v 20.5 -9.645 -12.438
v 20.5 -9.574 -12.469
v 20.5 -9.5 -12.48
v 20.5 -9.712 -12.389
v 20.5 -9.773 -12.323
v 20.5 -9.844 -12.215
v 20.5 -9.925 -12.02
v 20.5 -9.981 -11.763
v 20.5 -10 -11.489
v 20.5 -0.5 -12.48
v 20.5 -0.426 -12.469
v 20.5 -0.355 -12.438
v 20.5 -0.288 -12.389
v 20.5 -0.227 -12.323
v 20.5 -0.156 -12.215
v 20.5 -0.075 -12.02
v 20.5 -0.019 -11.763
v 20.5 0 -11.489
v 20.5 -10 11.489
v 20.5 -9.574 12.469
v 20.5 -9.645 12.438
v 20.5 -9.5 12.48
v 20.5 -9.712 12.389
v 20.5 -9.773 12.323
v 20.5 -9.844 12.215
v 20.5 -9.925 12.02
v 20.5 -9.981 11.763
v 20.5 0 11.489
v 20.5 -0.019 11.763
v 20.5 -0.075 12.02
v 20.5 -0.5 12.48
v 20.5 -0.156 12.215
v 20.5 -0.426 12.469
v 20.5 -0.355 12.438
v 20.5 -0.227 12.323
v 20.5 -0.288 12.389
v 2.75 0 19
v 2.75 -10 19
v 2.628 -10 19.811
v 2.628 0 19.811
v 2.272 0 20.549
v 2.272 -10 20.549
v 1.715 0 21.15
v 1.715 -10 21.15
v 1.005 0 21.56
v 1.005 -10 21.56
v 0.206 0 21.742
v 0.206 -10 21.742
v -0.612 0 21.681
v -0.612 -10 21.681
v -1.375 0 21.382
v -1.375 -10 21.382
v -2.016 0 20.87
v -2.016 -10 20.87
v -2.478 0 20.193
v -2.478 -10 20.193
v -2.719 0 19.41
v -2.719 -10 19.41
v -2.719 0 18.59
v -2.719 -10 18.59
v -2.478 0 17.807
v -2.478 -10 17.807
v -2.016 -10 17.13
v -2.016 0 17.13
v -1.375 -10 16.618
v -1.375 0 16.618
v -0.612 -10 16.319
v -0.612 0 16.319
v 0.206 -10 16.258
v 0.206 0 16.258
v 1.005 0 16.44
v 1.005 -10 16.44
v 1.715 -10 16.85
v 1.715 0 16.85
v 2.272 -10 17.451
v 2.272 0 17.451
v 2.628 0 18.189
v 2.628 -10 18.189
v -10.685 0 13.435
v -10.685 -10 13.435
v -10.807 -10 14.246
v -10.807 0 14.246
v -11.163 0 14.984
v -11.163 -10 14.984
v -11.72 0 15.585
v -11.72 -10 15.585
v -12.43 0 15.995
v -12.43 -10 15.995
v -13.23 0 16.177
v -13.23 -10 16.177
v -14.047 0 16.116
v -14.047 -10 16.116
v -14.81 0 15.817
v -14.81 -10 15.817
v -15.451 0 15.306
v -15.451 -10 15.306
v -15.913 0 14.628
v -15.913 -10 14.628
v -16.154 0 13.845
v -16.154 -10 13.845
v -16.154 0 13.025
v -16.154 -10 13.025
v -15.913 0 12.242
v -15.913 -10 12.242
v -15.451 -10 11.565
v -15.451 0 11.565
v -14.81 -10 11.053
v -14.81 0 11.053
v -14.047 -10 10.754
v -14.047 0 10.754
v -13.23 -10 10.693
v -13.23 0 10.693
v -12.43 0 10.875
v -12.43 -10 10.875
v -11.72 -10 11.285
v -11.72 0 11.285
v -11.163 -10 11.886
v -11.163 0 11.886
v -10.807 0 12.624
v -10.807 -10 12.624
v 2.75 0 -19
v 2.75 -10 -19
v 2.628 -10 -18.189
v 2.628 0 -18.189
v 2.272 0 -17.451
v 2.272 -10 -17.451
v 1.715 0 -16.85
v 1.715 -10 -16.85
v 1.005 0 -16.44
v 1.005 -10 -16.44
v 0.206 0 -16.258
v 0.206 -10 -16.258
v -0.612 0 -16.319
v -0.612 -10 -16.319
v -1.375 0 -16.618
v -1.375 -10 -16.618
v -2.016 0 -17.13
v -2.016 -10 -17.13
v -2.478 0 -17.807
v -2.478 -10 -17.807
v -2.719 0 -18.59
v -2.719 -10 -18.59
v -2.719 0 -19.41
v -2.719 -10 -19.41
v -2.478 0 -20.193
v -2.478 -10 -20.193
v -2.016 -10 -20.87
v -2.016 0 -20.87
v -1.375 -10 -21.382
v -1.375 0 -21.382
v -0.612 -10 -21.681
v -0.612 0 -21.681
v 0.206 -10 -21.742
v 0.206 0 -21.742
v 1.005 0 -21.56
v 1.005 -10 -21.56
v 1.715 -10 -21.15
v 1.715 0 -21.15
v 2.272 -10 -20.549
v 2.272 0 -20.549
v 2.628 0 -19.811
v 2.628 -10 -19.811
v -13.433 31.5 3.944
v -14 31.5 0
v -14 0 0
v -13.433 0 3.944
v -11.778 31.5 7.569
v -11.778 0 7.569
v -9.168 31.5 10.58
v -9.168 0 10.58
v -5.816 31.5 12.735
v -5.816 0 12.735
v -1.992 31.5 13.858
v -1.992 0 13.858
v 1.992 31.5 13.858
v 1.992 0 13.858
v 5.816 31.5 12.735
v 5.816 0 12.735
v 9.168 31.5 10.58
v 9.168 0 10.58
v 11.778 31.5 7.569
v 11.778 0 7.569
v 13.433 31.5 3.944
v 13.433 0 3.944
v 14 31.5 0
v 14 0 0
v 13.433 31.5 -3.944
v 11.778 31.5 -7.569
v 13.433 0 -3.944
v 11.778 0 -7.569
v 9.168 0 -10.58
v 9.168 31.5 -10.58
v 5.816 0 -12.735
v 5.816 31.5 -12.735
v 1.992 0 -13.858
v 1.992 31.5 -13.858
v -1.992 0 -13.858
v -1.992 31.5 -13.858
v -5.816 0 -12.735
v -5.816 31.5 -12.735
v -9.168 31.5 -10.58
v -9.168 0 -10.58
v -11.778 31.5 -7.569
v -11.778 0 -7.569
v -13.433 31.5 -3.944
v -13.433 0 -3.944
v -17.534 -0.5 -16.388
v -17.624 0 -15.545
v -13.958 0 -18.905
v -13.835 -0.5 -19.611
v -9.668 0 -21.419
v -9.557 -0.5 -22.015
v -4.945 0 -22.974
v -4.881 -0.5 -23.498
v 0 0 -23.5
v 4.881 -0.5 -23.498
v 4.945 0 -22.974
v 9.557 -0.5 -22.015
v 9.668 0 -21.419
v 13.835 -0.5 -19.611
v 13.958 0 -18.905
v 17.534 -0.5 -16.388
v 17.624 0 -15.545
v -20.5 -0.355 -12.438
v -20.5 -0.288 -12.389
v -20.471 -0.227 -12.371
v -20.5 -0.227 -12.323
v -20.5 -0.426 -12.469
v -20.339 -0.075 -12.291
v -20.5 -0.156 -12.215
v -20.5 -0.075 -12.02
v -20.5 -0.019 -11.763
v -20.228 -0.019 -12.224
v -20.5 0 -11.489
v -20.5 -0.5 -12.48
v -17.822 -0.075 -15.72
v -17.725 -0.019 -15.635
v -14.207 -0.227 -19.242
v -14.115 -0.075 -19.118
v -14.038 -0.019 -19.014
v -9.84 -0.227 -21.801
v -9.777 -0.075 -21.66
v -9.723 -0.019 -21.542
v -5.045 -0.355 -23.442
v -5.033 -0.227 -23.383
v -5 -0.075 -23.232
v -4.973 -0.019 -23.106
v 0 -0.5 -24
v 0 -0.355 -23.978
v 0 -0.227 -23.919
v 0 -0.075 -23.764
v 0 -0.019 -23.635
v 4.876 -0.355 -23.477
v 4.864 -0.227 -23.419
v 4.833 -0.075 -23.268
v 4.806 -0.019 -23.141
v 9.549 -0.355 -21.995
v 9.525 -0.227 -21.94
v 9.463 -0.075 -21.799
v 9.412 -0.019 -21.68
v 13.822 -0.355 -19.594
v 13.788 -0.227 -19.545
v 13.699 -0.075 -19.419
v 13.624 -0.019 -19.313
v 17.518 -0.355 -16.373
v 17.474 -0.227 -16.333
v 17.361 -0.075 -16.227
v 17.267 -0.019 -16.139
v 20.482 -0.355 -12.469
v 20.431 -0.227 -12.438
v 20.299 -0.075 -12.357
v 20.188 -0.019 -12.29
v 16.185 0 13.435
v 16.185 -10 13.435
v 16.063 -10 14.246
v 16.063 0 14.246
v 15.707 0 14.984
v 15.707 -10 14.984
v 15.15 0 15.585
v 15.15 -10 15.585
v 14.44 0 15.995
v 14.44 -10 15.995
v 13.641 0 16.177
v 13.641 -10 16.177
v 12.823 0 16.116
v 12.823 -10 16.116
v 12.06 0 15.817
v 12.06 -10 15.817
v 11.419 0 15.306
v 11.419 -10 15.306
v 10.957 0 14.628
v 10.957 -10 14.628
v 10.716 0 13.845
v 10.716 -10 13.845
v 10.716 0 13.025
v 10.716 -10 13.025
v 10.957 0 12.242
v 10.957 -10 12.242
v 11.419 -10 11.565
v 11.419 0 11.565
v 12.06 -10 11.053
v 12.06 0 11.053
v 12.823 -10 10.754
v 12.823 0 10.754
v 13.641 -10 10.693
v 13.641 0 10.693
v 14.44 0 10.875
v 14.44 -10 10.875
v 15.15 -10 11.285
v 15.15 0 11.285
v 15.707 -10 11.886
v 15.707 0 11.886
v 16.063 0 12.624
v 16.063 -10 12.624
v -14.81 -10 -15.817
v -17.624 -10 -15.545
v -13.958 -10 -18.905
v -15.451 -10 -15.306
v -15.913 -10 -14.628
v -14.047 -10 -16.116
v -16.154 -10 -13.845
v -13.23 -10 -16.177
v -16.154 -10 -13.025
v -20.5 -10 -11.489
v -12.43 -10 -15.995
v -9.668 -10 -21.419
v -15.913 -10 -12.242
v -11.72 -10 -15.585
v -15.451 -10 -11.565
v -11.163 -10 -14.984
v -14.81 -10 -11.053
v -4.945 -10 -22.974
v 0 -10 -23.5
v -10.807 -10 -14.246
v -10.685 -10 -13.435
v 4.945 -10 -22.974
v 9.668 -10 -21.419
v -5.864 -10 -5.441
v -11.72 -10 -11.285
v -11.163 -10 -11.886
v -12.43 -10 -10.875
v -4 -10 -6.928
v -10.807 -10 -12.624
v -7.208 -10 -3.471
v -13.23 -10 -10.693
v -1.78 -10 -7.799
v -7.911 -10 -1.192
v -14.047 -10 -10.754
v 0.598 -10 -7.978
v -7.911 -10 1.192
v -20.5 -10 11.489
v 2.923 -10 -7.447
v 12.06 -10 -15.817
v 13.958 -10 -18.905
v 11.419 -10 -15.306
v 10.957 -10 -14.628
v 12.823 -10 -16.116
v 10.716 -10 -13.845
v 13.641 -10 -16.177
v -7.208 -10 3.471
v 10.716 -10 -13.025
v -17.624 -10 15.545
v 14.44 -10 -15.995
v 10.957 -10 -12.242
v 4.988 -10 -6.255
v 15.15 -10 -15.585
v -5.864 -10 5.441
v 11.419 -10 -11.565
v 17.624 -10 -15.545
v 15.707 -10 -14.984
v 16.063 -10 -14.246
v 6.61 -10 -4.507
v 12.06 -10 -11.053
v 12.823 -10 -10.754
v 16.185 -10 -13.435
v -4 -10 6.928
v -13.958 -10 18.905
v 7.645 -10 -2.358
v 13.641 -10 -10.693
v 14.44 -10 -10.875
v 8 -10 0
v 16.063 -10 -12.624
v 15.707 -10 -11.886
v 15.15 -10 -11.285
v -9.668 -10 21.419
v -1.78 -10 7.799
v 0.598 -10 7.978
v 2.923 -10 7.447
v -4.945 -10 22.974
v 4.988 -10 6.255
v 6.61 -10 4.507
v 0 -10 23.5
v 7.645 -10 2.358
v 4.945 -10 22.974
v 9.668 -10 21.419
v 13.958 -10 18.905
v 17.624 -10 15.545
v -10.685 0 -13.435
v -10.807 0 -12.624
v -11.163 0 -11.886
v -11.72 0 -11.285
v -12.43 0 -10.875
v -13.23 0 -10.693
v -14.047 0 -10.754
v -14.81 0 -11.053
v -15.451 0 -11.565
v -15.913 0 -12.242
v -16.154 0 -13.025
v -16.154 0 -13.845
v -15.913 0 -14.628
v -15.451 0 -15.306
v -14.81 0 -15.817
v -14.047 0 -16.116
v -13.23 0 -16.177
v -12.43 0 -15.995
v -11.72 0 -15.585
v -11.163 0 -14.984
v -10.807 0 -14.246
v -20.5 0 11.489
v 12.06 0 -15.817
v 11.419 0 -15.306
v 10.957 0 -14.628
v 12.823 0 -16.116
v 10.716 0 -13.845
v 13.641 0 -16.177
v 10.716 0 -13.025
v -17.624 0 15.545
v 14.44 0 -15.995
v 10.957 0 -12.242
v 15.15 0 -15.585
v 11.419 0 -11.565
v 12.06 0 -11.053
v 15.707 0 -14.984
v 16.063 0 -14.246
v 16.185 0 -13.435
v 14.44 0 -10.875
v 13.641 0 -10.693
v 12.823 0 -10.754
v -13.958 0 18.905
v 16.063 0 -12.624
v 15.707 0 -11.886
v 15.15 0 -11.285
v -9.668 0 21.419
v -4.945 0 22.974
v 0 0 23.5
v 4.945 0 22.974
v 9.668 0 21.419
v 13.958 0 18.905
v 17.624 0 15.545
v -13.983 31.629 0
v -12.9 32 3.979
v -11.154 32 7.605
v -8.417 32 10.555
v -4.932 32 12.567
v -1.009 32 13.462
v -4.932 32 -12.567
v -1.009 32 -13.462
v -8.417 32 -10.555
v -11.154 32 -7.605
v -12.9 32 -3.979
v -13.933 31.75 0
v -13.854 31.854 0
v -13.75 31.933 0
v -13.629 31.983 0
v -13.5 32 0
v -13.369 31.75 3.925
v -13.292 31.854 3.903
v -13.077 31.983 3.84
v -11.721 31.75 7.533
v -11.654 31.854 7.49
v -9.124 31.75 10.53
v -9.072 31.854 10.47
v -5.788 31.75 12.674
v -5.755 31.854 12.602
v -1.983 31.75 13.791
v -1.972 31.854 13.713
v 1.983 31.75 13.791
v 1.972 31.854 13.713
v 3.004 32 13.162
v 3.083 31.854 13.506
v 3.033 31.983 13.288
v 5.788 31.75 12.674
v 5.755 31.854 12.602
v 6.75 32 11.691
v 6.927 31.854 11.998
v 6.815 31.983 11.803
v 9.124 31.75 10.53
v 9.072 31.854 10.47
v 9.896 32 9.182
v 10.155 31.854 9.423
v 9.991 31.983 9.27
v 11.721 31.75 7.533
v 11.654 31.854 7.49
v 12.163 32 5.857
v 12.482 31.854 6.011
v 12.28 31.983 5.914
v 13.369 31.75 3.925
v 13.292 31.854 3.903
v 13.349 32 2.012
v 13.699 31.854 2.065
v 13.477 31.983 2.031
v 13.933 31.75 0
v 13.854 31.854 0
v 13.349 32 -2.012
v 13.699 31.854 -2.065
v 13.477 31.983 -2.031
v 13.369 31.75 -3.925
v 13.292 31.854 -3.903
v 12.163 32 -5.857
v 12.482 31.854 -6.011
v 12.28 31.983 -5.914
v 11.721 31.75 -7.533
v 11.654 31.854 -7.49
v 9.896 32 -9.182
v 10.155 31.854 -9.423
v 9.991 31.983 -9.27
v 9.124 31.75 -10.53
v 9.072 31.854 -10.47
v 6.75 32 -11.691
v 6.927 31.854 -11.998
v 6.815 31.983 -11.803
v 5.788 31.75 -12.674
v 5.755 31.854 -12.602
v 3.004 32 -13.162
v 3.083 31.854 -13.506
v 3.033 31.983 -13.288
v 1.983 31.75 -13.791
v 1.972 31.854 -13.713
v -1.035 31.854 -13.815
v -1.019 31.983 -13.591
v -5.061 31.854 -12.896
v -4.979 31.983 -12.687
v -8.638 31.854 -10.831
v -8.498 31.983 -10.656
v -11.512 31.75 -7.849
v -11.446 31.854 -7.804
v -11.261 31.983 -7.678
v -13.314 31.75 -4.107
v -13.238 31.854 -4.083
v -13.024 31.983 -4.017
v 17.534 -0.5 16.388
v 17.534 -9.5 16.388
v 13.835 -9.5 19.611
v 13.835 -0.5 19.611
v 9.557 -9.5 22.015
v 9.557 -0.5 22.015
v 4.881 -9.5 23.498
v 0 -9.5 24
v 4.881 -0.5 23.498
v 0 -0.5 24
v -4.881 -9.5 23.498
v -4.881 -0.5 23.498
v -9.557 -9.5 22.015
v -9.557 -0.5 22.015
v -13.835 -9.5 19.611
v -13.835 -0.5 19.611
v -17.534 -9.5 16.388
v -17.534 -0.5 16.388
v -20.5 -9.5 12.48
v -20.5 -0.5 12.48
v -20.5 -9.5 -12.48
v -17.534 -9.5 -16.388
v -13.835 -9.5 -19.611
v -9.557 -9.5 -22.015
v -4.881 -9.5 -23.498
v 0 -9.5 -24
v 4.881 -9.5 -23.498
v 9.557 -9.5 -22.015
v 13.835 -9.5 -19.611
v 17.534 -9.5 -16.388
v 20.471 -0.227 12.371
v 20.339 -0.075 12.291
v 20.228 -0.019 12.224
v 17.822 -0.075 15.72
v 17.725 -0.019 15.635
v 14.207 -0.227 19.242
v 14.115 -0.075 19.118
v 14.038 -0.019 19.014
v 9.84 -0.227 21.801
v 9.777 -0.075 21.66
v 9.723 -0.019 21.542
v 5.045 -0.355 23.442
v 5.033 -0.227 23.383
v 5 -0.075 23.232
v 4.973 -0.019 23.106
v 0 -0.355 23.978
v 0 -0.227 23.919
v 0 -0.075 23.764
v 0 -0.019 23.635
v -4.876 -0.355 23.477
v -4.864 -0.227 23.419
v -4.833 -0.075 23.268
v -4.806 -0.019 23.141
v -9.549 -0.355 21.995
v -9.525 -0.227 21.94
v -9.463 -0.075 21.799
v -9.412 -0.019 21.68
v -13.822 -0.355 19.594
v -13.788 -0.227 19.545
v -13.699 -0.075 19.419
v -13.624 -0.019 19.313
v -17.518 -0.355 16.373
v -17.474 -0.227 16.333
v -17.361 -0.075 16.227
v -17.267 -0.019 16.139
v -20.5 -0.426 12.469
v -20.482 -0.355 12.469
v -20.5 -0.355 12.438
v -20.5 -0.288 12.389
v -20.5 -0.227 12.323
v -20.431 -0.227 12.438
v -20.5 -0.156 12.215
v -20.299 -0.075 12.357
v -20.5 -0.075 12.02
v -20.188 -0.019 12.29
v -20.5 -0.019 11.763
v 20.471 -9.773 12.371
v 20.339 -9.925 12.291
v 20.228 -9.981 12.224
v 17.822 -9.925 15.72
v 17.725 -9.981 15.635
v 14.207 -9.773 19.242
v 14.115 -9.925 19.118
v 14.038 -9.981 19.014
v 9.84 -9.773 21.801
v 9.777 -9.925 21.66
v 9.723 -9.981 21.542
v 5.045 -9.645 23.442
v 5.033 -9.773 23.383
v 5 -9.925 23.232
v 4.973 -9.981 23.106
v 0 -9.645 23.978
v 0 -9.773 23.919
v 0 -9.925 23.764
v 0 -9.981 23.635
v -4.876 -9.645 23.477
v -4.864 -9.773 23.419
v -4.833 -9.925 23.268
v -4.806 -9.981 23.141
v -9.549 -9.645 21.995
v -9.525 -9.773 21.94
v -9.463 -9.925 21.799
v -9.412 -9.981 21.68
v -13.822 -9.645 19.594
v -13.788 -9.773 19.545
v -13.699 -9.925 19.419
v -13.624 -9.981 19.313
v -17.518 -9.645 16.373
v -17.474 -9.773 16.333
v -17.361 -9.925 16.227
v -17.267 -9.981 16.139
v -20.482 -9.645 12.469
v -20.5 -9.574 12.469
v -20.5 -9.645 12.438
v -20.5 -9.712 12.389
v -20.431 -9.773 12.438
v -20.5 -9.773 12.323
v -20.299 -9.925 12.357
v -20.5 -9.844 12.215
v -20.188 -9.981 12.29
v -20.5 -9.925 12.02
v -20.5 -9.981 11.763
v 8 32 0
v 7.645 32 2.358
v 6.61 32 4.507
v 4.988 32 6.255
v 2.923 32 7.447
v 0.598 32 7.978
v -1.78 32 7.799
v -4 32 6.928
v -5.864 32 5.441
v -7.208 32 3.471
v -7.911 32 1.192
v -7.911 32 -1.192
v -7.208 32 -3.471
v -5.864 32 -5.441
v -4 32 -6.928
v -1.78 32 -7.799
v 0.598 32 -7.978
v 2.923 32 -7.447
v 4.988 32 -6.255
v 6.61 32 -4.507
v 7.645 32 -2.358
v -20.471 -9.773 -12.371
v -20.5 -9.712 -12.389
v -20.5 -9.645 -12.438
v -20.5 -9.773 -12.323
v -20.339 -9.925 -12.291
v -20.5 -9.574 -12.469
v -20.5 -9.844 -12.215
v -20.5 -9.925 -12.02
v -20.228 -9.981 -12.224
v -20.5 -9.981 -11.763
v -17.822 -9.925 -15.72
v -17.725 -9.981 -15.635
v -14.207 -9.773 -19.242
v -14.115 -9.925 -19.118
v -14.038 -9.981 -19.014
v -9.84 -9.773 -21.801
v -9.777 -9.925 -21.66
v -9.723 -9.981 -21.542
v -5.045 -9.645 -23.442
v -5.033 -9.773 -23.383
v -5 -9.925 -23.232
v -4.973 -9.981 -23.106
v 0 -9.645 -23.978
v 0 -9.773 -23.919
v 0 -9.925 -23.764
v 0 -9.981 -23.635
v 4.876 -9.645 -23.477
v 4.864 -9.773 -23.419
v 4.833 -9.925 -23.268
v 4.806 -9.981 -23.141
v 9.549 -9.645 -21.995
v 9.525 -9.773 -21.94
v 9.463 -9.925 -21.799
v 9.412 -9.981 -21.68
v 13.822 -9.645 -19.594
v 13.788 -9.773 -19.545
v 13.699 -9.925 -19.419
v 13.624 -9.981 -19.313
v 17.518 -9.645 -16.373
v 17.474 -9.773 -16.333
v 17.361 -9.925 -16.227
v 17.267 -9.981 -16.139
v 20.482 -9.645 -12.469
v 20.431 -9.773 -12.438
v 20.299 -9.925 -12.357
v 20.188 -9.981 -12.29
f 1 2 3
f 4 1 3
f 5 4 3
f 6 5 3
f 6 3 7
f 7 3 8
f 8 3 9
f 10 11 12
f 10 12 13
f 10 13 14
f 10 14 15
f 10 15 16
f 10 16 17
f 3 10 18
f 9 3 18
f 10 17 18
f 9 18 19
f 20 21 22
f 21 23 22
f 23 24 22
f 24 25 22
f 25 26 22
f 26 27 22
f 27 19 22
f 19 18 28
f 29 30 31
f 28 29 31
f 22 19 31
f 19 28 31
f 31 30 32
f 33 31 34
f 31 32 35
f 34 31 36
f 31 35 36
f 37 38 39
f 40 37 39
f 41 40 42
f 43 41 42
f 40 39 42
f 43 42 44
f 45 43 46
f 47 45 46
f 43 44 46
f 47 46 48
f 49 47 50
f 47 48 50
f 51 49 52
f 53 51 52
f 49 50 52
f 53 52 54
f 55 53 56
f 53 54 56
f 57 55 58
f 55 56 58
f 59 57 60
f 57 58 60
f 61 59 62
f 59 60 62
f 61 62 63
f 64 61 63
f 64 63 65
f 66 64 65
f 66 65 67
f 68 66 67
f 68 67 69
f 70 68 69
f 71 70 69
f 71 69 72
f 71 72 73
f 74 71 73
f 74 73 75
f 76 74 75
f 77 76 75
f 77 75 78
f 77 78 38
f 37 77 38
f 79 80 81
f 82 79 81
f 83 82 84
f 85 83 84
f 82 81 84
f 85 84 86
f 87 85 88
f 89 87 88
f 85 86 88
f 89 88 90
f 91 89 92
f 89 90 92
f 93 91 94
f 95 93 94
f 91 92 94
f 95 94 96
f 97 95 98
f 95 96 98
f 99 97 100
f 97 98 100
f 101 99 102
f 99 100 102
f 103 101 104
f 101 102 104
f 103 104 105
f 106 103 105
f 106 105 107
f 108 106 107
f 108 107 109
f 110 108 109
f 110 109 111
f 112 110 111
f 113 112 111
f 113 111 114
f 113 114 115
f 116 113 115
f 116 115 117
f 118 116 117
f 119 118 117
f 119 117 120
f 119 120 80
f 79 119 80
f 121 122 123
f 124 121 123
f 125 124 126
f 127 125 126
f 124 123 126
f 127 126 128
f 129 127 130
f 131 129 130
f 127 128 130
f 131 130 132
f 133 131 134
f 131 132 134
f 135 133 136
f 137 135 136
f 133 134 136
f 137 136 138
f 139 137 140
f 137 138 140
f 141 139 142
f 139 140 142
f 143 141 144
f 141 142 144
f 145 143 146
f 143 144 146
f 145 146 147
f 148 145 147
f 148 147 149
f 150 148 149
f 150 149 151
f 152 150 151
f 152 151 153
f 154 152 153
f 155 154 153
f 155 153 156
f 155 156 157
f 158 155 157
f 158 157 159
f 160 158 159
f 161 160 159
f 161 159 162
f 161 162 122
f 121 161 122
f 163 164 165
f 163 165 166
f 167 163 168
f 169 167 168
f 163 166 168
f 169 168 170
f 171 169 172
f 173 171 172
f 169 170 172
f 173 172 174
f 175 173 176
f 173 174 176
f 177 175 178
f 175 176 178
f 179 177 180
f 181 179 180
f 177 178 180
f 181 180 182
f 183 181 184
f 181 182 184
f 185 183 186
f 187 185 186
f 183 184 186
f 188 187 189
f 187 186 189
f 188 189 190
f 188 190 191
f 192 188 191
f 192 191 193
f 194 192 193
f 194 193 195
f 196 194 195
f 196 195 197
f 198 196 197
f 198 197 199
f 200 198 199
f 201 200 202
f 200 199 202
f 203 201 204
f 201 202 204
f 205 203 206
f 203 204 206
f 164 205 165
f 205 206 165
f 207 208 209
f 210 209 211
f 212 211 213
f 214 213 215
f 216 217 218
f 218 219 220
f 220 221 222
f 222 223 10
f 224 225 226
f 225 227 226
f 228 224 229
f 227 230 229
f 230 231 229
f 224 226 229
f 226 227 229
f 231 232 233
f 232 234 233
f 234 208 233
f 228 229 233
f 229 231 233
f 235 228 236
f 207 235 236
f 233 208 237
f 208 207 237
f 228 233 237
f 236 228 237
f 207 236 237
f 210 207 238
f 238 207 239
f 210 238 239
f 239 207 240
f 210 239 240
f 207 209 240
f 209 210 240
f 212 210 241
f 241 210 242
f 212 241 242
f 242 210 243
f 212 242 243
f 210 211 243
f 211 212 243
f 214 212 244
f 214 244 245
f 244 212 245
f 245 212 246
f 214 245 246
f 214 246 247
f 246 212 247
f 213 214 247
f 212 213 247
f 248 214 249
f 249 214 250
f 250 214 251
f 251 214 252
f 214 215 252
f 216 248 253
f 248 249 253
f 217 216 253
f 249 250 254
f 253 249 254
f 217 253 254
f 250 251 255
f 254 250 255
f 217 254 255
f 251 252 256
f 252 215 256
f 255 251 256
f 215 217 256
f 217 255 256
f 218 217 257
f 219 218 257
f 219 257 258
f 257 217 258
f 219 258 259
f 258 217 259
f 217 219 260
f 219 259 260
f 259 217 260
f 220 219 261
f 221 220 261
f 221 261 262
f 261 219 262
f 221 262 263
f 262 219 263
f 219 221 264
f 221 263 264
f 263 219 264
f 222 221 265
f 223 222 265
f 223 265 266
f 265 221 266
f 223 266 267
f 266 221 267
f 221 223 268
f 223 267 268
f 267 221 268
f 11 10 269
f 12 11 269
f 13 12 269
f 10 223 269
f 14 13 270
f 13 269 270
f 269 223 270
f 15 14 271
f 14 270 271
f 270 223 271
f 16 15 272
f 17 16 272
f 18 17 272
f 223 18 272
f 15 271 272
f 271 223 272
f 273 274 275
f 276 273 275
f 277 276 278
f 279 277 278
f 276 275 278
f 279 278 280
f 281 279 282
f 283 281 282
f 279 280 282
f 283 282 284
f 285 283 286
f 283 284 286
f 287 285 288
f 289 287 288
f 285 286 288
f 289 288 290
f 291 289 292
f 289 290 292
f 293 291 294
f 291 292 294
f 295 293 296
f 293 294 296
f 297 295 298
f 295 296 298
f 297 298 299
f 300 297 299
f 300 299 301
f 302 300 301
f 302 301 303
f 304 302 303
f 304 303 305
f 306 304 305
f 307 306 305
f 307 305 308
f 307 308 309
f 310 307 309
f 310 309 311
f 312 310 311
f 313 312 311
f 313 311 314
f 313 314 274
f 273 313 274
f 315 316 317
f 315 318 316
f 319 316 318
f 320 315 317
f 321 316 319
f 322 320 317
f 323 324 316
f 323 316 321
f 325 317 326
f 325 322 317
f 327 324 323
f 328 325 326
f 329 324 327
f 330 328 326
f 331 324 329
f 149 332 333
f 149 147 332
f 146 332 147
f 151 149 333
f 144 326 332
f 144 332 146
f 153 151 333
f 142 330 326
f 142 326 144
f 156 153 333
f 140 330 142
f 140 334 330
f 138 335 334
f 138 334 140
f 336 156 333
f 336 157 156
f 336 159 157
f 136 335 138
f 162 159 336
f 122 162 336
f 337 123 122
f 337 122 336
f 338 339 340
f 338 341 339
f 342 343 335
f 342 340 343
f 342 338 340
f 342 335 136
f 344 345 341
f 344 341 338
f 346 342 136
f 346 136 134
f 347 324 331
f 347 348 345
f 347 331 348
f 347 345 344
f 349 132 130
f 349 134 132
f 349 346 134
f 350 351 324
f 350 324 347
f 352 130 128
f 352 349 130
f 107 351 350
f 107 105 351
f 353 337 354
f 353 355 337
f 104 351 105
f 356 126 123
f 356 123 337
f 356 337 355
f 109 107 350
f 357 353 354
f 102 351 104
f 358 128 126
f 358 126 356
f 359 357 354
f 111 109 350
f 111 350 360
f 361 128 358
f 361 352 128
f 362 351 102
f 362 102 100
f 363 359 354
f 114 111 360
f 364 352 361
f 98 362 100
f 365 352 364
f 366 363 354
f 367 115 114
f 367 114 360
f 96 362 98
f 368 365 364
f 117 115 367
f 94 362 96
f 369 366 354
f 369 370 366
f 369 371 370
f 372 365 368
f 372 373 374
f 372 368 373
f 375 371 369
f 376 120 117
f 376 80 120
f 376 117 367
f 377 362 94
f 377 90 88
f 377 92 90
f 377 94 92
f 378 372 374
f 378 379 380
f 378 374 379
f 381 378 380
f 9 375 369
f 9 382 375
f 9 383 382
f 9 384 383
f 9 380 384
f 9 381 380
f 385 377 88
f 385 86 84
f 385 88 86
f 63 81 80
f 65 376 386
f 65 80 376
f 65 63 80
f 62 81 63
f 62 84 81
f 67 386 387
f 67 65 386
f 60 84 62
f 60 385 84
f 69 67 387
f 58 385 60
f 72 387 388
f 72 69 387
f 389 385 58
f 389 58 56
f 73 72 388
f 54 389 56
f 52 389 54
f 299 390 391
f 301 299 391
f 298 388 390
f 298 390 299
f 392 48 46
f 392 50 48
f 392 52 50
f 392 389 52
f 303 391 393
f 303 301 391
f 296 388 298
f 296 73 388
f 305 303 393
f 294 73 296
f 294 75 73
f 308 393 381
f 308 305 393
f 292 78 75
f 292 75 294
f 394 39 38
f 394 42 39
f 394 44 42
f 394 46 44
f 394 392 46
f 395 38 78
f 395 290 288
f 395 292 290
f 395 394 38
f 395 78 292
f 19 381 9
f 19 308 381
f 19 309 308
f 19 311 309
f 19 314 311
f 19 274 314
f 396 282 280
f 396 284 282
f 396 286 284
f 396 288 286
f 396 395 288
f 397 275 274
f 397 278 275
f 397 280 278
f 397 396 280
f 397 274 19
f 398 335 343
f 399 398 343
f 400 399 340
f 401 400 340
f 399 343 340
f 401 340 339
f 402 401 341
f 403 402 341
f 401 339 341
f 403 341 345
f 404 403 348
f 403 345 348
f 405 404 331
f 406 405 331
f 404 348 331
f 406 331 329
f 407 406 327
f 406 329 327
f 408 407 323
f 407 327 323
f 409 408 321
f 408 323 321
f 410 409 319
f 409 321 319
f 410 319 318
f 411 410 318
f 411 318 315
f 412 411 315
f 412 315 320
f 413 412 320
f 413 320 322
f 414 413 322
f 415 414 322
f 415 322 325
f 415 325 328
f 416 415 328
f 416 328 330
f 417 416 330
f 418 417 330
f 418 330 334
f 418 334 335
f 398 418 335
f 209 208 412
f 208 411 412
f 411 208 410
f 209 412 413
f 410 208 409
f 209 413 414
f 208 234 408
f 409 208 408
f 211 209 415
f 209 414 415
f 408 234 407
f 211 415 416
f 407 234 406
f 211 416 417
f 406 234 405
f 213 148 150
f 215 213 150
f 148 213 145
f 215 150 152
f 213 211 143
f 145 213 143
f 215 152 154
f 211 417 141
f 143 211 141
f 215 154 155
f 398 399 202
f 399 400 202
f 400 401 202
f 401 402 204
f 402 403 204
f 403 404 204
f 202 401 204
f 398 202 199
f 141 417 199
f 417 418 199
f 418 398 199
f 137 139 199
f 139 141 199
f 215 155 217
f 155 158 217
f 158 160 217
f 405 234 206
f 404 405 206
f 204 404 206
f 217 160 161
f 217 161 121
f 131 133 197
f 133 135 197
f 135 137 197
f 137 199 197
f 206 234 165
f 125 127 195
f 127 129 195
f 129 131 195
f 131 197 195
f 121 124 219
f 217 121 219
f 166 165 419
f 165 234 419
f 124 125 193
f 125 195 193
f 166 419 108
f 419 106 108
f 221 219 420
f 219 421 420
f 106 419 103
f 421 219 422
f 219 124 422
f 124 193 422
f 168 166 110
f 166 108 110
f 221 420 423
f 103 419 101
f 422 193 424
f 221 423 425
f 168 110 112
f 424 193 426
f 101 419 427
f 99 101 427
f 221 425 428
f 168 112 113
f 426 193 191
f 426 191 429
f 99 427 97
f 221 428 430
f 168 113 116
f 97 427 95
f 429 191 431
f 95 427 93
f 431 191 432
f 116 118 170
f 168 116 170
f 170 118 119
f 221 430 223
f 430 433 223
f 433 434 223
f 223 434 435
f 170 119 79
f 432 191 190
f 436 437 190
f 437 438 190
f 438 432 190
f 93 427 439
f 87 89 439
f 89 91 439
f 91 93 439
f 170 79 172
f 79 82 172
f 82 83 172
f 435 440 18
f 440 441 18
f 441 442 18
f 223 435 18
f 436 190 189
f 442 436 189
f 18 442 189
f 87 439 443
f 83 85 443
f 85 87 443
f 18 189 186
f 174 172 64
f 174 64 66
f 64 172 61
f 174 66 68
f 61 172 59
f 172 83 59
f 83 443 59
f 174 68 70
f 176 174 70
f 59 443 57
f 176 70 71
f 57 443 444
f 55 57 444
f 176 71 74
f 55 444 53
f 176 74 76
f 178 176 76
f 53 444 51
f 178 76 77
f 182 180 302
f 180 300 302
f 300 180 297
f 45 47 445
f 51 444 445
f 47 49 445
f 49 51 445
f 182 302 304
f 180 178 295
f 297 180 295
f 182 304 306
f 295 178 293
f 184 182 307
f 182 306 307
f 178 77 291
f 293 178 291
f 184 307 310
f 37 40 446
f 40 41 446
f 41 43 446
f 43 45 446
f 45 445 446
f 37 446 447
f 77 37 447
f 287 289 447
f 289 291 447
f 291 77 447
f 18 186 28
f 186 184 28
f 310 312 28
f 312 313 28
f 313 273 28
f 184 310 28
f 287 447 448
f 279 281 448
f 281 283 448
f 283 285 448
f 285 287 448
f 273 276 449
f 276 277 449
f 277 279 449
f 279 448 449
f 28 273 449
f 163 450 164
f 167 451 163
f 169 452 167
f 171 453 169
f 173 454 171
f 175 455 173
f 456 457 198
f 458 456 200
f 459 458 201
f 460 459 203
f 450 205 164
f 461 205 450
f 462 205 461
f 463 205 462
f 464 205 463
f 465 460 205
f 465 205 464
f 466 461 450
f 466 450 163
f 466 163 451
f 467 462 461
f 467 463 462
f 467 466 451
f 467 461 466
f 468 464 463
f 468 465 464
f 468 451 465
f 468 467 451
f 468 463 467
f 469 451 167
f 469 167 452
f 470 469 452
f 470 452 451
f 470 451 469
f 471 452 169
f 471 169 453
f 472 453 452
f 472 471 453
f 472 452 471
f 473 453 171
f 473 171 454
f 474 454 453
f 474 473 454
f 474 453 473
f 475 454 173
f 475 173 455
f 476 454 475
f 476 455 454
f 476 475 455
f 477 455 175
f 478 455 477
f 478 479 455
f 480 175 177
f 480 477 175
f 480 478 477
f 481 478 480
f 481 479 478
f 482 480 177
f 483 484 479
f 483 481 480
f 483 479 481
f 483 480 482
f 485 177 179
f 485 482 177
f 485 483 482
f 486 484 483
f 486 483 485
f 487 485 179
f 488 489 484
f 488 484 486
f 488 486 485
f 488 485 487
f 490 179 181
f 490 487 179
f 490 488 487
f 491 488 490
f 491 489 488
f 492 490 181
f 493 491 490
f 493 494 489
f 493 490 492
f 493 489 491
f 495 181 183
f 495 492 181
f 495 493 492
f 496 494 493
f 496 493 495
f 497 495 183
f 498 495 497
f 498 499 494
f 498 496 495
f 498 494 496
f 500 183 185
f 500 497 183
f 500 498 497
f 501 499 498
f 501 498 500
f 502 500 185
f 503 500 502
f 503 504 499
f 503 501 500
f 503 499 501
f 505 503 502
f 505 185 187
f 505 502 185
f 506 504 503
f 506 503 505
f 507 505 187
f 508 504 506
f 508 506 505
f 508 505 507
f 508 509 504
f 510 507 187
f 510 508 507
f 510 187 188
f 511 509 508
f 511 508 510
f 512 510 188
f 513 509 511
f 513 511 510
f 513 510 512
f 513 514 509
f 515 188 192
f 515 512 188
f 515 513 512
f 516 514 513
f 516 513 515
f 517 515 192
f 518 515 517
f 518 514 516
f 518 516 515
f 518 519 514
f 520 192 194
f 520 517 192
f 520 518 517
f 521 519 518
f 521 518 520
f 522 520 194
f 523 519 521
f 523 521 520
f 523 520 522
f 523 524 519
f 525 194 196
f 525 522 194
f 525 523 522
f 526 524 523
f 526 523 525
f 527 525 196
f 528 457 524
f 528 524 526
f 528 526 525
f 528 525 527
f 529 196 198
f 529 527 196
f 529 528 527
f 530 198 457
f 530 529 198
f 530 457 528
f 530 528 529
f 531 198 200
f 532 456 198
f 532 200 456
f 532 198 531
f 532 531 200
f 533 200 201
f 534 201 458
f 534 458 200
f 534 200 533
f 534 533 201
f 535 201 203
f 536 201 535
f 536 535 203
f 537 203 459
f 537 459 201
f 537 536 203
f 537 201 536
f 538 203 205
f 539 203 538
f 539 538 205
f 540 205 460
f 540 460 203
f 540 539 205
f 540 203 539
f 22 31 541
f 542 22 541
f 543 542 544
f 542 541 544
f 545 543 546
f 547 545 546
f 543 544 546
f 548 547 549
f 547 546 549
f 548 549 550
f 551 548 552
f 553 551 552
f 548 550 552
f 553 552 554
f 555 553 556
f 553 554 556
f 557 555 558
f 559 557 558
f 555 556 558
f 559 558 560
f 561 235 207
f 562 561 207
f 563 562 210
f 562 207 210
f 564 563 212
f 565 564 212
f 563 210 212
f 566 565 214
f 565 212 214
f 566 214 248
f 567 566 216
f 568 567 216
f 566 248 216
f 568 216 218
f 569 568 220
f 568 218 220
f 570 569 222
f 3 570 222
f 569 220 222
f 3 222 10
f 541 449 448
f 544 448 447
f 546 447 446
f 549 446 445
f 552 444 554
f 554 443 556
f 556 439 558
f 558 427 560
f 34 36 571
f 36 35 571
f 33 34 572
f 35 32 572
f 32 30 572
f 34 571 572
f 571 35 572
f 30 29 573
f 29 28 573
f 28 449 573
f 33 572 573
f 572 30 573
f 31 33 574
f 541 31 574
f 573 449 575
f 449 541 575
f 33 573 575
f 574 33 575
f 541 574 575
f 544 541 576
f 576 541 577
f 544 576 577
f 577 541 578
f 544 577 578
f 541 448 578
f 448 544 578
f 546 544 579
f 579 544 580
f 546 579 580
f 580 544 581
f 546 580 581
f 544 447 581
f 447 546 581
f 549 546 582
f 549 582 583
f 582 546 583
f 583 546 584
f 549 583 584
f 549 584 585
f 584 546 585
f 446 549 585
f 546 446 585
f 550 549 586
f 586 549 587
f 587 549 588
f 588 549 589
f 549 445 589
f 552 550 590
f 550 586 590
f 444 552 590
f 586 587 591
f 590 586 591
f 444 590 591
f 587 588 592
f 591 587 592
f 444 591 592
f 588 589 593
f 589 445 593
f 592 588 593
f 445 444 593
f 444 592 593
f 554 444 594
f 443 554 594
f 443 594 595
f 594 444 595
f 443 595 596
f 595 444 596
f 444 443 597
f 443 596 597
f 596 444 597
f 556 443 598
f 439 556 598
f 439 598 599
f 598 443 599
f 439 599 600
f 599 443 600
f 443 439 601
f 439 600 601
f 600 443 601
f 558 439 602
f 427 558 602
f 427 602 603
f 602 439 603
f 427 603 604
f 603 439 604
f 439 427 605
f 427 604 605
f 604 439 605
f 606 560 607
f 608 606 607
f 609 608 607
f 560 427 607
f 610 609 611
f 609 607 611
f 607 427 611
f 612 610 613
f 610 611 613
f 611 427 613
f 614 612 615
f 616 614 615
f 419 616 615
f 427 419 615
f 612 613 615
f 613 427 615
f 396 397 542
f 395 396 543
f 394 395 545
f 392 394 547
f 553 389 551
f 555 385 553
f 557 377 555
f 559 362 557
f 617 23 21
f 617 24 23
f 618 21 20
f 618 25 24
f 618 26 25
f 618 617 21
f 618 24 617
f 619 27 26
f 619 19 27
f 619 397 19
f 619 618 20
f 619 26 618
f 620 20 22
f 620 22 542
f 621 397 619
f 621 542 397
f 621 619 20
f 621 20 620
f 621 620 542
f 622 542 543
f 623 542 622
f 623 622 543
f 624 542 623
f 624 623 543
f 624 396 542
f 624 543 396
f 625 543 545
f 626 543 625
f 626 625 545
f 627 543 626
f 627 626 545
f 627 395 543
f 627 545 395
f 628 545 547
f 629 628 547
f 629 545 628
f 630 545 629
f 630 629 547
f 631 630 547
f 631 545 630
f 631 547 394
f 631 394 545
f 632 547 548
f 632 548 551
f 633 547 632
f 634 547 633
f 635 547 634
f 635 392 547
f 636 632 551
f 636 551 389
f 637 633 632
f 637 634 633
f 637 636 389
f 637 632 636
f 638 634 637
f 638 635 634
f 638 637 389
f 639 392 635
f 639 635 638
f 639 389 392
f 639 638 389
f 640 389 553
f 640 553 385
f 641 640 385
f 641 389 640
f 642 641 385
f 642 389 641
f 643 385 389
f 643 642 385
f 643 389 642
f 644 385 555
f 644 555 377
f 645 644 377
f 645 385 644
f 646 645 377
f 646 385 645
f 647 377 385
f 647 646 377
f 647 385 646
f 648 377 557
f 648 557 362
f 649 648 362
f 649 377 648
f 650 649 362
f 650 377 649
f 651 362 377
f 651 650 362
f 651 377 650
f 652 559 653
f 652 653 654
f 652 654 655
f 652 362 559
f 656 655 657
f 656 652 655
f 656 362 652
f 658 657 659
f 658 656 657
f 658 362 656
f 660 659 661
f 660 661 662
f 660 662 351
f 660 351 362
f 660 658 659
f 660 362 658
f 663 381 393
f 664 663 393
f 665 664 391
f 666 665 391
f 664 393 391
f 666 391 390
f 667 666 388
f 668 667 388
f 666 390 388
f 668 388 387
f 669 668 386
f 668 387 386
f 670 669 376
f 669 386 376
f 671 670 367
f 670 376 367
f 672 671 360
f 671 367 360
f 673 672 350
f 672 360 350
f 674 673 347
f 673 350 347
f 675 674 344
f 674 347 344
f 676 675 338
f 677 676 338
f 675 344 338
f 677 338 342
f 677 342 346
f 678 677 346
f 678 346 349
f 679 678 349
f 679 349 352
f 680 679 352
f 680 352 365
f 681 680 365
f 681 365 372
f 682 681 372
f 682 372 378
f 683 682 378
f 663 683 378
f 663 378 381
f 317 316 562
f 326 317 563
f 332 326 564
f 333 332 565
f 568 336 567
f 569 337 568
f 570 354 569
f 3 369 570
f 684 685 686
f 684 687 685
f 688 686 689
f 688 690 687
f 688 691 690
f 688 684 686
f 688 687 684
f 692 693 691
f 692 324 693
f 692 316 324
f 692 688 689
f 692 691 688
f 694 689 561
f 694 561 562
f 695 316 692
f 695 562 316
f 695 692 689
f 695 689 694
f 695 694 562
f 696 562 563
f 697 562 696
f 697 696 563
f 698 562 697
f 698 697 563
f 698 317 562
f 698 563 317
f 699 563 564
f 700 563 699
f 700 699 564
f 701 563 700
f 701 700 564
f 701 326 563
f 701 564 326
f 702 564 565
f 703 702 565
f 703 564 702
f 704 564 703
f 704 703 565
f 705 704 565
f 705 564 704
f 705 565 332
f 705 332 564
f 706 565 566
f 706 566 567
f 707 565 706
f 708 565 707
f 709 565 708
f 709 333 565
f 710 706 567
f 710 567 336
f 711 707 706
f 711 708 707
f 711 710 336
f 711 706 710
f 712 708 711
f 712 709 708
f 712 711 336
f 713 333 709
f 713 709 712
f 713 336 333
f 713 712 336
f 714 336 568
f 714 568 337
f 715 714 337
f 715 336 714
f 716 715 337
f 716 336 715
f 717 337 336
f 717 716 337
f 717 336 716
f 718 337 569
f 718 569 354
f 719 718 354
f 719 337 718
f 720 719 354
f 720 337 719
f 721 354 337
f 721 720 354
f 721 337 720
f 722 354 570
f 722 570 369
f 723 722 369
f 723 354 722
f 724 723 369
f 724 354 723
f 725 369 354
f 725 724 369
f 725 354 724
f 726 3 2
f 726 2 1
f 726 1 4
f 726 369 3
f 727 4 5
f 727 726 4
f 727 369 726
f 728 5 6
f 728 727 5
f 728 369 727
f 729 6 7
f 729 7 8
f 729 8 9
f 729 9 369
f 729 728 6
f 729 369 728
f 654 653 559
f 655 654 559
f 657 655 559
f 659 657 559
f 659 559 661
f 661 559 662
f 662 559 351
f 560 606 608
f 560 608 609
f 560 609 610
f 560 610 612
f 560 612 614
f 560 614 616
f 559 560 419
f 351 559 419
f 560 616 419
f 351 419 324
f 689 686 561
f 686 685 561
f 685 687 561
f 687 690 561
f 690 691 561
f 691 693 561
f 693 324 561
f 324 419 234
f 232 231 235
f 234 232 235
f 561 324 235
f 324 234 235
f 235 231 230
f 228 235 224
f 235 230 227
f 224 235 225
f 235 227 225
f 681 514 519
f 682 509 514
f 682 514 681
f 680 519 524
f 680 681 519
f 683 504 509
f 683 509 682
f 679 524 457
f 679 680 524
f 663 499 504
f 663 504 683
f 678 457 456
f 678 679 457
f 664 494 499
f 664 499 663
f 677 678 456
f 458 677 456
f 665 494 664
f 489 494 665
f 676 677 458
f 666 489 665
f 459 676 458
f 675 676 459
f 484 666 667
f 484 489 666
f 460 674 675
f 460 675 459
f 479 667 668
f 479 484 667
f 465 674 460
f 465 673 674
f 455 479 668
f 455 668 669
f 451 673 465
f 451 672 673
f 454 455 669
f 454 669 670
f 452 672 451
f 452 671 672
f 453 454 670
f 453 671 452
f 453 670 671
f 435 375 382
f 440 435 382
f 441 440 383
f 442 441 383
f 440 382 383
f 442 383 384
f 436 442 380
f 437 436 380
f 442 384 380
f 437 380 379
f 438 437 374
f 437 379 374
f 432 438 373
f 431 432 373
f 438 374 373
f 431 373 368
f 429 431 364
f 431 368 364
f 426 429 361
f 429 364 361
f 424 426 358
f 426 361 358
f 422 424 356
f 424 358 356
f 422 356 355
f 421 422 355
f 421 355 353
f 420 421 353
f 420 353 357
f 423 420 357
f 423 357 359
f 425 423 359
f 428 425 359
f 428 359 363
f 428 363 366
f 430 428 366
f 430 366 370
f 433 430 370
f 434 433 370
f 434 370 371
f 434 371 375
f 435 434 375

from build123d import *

# Parameters (mm, degrees)
F1_DEPTH = 10
F2_R     = 2.75
F3_DEPTH = 10.001
F4_R     = 14
F5_DEPTH = 32
F6_R     = 8
F7_DEPTH = 42.001
F8_R     = 0.5


with BuildPart() as f1:
    # F0 (on Front) → F1 (new body)
    with BuildSketch(Plane.XZ):
        with BuildLine():
            Line((-20.5, 12.479984), (-20.5, -12.479984))
            ThreePointArc((-20.5, -12.479984), (0, -24), (20.5, -12.479984))
            Line((20.5, -12.479984), (20.5, 12.479984))
            ThreePointArc((20.5, 12.479984), (0, 24), (-20.5, 12.479984))
        make_face()
    extrude(amount=F1_DEPTH)

    # F2 (on face) → F3 (cut, through all)
    with BuildSketch(Plane.XZ.offset(10)):
        with Locations((0, 19)):
            Circle(F2_R)
        with Locations((-13.435029, 13.435029)):
            Circle(F2_R)
        with Locations((13.435029, -13.435029)):
            Circle(F2_R)
        with Locations((13.435029, 13.435029)):
            Circle(F2_R)
        with Locations((-13.435029, -13.435029)):
            Circle(F2_R)
        with Locations((0, -19)):
            Circle(F2_R)
    extrude(amount=-F3_DEPTH, mode=Mode.SUBTRACT)

    # F4 (on face) → F5 (join)
    with BuildSketch(Plane(origin=(0, 0, 0), x_dir=(-1, 0, 0), z_dir=(0, 1, 0))):
        Circle(F4_R)
    extrude(amount=F5_DEPTH)

    # F6 (on face) → F7 (cut, through all)
    with BuildSketch(Plane.XZ.offset(10)):
        Circle(F6_R)
    extrude(amount=-F7_DEPTH, mode=Mode.SUBTRACT)

    # F8
    f8_edges = [f1.edges().sort_by_distance(p)[0] for p in [
        (14, 32, 0),
        (0, 0, 24),
        (0, 0, -24),
        (0, -10, -24),
        (0, -10, 24),
    ]]
    fillet(f8_edges, radius=F8_R)


solid = f1.part
